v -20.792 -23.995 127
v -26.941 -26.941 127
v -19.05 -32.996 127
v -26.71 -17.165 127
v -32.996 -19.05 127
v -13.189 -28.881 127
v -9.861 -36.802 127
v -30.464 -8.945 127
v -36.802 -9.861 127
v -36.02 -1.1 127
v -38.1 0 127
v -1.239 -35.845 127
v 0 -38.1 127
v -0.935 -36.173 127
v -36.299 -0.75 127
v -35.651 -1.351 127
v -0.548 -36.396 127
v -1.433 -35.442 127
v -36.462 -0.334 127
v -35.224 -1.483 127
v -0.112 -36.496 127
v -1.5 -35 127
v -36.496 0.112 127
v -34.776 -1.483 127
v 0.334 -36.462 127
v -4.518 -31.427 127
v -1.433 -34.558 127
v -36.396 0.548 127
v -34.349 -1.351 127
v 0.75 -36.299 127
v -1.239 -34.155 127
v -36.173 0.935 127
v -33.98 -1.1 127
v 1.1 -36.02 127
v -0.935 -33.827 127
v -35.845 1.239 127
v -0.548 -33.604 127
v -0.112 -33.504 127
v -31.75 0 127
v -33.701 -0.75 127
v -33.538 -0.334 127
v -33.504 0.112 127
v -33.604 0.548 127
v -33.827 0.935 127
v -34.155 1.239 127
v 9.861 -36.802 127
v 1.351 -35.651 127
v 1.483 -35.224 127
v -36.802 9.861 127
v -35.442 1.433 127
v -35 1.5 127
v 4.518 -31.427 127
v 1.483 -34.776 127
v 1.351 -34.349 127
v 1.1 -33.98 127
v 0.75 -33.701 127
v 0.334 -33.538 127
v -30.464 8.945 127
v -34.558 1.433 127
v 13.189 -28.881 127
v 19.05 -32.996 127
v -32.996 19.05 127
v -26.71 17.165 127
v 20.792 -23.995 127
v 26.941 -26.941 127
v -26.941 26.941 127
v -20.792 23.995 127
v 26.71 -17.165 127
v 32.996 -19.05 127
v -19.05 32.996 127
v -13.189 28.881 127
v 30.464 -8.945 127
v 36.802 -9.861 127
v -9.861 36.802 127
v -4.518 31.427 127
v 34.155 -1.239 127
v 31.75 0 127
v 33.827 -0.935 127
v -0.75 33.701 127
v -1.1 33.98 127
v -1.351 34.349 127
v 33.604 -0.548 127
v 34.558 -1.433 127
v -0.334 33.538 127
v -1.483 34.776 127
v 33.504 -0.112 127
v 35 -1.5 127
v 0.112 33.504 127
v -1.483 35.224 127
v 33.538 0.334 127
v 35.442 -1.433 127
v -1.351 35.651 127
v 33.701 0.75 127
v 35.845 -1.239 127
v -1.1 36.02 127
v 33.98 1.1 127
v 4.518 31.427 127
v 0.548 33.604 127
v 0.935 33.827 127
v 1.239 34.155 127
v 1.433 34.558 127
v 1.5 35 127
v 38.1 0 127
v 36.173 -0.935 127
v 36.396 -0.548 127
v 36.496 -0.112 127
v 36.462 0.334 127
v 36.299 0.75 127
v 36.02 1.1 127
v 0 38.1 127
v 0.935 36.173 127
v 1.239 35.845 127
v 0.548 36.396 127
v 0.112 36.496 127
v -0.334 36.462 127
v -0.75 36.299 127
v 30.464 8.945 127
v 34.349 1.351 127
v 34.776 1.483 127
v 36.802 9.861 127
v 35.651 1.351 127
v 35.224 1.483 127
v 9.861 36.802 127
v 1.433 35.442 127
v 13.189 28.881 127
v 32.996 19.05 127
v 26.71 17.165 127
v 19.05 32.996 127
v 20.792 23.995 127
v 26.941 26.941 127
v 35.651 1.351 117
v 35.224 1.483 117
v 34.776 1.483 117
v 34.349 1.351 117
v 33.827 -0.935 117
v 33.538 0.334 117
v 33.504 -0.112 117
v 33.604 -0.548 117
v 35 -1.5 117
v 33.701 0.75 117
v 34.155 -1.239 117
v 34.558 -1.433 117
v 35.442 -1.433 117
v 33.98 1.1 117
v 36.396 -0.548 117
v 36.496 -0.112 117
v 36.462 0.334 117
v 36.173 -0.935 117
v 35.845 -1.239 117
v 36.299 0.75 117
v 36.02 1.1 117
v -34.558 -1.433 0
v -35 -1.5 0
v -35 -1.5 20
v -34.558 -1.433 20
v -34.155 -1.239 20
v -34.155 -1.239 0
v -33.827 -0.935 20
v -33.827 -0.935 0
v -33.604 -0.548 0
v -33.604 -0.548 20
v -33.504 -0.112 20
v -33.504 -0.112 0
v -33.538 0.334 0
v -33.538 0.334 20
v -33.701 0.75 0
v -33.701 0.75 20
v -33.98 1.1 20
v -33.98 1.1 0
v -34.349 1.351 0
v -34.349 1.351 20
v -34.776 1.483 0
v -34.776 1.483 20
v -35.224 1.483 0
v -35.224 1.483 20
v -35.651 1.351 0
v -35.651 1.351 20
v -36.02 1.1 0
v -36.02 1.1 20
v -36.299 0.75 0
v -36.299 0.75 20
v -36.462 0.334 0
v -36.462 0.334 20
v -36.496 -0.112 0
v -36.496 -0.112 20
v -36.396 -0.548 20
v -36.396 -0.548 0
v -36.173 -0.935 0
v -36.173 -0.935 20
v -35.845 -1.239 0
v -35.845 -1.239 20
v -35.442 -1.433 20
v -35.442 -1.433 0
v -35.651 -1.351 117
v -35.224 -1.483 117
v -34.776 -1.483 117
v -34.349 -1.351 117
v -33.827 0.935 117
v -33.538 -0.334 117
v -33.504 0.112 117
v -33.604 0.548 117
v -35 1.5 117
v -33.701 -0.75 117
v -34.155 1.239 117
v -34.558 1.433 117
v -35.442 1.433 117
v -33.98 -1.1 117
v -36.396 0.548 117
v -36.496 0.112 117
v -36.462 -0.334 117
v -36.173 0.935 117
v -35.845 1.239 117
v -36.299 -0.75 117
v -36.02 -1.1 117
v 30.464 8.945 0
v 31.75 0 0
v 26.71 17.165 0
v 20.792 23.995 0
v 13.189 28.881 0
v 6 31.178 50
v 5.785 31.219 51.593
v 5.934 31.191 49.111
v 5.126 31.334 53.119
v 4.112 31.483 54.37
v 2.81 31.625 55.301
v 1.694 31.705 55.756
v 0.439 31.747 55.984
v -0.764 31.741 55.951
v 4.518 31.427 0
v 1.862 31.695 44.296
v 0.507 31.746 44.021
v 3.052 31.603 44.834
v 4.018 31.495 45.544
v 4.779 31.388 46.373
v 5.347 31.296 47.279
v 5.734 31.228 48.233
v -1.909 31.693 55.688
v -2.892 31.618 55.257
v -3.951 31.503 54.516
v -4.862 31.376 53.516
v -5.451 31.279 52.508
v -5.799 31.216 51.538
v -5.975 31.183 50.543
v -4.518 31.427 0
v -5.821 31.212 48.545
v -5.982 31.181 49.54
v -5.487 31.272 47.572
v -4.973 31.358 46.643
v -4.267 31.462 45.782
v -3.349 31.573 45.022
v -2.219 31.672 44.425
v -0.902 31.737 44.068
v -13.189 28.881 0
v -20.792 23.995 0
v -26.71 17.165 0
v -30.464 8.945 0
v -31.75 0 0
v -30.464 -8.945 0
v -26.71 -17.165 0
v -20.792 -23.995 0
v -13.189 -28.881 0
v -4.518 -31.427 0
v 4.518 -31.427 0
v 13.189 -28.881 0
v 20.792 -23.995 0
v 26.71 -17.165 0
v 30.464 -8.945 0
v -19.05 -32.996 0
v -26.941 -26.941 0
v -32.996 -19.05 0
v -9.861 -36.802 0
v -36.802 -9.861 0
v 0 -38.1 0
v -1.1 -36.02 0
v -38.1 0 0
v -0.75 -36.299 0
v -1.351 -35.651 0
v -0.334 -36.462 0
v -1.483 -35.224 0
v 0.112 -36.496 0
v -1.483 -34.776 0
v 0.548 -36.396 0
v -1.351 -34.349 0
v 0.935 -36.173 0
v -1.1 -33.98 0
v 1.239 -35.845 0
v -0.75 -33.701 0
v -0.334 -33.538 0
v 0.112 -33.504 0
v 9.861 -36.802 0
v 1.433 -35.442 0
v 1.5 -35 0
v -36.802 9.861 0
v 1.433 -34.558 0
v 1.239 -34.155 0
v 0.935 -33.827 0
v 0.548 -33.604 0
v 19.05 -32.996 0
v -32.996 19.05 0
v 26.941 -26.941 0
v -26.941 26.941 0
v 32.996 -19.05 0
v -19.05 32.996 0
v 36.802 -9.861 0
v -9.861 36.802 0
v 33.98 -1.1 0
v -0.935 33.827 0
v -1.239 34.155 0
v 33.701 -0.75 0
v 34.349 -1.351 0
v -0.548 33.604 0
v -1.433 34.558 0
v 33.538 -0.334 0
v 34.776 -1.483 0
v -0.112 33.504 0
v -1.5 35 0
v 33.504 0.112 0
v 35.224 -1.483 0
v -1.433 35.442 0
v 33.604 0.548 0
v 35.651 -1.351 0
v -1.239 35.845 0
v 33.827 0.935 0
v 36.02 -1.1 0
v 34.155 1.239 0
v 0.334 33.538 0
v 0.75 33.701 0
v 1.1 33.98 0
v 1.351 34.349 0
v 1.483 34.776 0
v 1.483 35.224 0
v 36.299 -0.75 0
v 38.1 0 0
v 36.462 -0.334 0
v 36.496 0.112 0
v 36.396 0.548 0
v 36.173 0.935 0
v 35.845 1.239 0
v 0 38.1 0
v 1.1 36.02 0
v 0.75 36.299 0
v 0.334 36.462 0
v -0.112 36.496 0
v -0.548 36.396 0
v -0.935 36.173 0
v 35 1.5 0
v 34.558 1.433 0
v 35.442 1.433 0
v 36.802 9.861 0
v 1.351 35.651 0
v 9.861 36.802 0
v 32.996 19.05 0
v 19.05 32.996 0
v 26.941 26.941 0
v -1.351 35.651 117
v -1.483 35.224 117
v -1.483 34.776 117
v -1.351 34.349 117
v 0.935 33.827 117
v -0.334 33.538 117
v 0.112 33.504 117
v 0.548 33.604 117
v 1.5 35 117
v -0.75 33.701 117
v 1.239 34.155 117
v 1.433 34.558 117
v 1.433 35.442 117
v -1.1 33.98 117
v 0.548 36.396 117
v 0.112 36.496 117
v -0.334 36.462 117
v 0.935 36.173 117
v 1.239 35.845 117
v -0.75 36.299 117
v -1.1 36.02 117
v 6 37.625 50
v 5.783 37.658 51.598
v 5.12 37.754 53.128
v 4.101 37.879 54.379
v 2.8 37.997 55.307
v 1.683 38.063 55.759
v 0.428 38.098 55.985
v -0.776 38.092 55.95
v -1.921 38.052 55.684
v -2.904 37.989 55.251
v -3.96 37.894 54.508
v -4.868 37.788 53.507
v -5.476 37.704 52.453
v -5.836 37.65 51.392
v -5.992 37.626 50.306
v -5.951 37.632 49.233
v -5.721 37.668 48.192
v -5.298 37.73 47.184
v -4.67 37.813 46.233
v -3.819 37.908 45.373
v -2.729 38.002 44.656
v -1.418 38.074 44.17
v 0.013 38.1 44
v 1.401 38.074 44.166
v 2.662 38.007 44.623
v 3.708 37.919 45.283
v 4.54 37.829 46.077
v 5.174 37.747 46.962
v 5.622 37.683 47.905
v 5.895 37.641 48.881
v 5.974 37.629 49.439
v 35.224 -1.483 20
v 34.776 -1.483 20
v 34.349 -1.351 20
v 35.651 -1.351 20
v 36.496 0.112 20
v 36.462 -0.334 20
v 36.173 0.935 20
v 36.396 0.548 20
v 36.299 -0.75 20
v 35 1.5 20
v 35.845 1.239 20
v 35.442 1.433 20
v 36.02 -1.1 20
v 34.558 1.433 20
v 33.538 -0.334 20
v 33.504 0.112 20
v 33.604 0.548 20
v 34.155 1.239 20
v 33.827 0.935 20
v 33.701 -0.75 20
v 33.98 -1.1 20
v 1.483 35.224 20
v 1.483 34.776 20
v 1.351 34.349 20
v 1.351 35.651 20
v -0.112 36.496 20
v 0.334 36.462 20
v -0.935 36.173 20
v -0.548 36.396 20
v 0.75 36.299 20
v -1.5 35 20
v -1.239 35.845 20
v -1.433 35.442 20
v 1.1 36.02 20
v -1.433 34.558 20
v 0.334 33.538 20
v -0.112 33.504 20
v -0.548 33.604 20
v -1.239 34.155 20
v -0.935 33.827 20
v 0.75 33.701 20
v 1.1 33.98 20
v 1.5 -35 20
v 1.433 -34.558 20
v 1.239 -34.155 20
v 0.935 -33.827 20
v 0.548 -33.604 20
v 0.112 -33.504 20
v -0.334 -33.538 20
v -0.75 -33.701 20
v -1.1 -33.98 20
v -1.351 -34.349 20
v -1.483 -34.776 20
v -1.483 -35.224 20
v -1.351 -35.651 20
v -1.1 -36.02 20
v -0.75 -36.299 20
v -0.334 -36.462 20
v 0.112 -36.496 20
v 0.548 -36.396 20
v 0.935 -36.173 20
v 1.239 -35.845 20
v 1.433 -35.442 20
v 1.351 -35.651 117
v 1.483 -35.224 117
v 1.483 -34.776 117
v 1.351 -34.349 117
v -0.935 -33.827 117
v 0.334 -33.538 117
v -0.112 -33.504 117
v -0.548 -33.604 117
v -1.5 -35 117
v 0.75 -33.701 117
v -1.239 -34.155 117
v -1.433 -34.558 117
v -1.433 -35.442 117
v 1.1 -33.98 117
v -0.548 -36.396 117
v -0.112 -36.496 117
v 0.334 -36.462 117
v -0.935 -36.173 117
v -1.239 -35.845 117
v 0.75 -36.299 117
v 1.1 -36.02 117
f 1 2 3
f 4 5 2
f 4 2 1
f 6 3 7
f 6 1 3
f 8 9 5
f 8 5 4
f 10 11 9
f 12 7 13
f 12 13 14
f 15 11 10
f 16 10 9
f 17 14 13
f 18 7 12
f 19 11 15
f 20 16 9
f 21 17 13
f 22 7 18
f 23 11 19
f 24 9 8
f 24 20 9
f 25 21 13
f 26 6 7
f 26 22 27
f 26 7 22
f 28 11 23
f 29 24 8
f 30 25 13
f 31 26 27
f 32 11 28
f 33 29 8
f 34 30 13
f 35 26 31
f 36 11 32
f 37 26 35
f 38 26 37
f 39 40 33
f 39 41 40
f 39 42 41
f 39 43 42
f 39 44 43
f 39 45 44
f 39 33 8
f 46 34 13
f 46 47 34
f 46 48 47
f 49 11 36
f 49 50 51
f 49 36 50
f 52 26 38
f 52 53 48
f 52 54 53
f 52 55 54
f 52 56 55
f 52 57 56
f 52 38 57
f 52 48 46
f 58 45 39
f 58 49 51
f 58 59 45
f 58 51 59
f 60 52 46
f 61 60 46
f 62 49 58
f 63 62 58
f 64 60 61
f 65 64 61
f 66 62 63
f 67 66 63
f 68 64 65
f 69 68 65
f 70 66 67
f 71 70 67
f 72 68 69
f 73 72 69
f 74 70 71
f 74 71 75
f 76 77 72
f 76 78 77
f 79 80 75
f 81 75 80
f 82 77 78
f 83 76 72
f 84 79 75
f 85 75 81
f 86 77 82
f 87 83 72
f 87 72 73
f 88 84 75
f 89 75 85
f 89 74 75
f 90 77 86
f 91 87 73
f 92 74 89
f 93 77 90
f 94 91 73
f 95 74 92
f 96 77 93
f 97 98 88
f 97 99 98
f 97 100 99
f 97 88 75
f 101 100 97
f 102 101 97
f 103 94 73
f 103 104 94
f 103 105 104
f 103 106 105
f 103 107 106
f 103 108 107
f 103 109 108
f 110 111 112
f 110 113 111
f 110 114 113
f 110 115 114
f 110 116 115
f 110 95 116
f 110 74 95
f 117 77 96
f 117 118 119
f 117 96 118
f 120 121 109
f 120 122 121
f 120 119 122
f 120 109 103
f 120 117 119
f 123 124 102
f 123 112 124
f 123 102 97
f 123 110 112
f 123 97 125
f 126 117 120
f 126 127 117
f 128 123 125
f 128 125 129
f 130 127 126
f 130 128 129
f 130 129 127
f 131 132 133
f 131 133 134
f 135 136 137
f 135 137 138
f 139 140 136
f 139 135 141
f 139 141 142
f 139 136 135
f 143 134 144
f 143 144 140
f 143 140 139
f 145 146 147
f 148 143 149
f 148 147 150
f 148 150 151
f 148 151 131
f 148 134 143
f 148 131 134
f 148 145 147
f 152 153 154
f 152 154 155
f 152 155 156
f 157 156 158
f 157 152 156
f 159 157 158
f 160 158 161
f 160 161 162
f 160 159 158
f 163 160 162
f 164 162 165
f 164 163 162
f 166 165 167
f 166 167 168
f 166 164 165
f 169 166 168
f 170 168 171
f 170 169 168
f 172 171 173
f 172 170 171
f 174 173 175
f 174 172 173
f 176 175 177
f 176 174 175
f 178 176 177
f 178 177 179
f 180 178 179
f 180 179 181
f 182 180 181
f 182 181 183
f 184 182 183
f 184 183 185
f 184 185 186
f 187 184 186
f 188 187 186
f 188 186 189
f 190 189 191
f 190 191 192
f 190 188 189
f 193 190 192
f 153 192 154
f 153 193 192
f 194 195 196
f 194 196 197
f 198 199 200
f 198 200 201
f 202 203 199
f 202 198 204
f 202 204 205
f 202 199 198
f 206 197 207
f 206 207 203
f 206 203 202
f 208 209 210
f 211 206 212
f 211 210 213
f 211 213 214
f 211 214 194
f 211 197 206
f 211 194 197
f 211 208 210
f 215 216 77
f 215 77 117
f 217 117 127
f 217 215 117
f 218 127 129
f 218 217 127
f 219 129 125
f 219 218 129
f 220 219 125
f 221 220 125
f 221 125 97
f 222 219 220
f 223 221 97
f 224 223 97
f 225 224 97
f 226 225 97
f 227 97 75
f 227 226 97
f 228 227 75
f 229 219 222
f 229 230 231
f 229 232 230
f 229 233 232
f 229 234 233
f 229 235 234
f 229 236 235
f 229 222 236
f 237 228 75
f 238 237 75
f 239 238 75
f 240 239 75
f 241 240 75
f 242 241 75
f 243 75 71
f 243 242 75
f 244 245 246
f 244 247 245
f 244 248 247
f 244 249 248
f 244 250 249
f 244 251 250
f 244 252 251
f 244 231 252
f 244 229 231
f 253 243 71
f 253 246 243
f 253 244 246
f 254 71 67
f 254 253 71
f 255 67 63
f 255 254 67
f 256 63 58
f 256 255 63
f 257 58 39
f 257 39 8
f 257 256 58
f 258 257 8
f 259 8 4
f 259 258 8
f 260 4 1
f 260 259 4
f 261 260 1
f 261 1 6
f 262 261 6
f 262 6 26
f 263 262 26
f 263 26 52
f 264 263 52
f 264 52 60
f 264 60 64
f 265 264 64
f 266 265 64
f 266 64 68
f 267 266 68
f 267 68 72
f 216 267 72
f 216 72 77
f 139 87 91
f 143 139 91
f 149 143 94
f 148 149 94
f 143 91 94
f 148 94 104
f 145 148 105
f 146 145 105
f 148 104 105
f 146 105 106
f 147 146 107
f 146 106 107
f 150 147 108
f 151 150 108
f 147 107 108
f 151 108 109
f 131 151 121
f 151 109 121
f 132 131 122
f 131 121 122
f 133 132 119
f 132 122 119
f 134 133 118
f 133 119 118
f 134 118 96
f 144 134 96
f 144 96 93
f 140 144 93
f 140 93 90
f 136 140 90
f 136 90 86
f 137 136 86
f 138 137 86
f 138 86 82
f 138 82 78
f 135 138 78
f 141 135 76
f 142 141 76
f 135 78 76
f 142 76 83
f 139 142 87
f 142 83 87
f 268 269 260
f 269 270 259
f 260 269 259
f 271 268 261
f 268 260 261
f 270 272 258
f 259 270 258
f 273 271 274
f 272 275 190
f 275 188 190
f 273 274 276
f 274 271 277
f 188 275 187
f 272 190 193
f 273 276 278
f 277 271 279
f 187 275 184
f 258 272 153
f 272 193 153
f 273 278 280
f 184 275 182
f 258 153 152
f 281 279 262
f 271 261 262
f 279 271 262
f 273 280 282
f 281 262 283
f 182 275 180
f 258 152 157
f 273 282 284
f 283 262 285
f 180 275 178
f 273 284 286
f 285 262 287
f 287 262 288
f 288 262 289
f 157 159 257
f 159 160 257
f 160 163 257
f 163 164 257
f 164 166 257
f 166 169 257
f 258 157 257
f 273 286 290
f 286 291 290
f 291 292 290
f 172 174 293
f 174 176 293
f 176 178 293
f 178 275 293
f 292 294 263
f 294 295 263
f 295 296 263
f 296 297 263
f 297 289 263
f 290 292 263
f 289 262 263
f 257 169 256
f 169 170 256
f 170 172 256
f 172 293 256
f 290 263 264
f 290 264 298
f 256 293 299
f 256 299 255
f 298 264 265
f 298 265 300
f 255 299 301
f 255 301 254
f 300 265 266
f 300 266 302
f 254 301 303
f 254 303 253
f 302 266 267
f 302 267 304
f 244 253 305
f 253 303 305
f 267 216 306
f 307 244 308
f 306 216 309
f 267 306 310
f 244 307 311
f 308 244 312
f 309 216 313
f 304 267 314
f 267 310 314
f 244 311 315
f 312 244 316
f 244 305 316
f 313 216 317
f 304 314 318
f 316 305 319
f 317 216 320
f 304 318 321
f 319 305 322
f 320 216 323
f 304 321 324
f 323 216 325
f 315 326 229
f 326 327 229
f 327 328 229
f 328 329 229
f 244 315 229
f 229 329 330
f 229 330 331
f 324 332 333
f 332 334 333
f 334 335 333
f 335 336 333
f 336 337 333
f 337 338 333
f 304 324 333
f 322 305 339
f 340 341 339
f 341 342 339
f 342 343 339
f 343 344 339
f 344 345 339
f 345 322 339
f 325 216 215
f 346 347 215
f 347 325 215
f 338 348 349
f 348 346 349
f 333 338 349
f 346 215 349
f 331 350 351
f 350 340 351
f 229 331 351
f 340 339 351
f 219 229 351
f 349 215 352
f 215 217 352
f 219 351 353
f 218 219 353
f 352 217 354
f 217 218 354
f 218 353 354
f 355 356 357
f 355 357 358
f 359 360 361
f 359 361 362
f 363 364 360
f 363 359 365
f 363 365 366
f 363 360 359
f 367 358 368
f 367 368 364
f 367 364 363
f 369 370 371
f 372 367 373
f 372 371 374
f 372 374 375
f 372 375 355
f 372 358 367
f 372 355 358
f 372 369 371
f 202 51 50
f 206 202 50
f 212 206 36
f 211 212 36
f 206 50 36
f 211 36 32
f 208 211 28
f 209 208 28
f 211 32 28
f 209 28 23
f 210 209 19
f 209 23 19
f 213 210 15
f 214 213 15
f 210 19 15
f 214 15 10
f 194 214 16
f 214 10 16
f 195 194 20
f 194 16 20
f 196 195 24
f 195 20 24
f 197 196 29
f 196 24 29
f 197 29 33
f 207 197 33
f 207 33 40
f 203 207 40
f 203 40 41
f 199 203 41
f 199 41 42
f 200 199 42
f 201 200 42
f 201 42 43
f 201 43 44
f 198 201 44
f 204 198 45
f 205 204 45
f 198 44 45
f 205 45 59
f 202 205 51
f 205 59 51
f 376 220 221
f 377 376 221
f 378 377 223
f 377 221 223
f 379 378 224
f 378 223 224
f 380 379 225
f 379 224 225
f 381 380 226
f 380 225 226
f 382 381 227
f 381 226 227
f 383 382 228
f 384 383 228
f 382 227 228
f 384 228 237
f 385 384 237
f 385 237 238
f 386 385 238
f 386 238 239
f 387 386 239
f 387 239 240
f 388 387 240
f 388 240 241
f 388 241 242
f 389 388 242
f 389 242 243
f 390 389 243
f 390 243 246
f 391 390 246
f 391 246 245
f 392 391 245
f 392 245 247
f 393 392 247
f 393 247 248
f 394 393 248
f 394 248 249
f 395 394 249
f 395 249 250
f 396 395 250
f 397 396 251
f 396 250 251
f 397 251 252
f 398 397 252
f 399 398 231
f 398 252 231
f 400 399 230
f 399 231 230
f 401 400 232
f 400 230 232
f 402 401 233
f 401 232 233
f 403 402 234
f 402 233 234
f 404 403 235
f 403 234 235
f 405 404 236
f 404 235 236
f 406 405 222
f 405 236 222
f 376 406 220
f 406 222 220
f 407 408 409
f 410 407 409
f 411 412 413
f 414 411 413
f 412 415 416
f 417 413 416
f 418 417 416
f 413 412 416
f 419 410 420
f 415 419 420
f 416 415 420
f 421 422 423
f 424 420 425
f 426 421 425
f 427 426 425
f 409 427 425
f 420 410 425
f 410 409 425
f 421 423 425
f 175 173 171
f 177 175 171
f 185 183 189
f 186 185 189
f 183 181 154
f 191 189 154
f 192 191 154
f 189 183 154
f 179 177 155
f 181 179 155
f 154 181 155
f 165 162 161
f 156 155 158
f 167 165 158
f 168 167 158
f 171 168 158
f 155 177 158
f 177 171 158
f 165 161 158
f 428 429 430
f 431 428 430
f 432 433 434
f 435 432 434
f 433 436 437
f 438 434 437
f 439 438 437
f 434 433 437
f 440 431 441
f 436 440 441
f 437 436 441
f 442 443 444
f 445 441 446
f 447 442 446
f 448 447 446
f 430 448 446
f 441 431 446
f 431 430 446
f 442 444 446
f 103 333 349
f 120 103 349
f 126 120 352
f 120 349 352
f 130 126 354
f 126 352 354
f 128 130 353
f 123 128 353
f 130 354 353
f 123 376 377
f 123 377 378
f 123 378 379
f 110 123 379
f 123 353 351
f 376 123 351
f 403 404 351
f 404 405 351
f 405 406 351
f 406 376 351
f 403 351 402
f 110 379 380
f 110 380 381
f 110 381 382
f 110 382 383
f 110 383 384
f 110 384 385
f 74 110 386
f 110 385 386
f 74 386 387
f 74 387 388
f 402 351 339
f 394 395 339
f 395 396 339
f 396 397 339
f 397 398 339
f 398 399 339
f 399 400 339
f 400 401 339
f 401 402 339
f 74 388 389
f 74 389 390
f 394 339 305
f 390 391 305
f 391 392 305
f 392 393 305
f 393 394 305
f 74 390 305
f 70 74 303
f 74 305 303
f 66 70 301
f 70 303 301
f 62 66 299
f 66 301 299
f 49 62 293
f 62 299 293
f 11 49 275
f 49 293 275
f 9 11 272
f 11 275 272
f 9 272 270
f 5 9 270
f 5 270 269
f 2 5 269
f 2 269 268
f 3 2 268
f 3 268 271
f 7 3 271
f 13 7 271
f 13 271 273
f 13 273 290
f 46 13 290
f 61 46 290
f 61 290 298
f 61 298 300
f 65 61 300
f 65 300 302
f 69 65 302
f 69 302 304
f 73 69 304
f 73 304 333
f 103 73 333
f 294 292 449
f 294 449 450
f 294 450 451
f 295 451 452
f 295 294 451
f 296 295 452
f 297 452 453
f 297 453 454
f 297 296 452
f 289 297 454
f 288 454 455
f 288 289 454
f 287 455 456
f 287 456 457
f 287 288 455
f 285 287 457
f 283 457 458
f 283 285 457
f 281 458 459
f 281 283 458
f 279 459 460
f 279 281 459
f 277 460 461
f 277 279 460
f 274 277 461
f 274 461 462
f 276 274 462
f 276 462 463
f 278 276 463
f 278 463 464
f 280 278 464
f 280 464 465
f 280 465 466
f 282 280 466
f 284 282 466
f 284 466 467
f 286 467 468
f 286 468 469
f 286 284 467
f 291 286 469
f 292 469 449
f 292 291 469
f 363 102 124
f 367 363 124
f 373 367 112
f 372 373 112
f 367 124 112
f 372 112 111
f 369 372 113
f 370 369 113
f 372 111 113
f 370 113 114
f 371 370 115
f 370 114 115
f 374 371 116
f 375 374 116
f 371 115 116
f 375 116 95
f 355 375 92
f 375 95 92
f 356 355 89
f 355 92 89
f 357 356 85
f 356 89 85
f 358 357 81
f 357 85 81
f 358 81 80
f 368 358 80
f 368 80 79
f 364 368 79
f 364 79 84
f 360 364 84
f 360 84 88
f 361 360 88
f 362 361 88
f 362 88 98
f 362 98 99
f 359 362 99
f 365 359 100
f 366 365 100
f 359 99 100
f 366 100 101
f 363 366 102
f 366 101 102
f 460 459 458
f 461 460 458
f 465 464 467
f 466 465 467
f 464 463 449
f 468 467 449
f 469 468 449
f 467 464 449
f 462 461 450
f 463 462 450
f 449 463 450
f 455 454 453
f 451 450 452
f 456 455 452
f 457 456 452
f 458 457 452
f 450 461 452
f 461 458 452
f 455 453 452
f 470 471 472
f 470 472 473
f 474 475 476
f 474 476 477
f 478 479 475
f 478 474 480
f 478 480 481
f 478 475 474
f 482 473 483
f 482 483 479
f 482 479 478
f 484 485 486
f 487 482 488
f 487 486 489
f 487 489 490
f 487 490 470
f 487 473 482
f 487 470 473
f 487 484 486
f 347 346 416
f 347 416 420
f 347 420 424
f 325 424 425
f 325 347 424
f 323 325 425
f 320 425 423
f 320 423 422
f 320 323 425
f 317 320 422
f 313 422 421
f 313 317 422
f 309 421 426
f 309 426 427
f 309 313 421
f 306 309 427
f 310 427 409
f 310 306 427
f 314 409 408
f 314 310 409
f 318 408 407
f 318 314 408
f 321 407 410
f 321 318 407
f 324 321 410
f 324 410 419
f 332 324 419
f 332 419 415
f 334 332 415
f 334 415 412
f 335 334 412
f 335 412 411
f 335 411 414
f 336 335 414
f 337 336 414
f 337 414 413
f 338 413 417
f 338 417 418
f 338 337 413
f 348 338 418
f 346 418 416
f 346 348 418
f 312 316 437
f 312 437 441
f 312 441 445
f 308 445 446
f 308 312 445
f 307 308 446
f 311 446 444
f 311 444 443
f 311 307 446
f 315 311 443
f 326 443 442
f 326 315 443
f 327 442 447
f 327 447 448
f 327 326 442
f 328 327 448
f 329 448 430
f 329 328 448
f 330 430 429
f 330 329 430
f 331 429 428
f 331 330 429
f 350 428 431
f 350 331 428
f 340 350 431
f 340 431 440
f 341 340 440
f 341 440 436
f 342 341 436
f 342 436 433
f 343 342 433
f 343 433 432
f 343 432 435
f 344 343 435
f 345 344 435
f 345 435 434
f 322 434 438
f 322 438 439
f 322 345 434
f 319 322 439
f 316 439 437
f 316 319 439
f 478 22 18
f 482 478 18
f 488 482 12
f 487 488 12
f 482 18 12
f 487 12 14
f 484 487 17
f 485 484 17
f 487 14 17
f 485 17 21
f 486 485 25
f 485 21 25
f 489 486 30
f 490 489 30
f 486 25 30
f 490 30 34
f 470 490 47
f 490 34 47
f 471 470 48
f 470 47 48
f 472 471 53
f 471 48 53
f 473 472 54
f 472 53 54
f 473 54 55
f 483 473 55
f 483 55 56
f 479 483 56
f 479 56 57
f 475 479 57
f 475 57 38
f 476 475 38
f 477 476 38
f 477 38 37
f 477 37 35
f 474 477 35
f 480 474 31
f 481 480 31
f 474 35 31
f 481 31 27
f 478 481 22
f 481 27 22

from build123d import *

# Parameters (mm, degrees)
F0_R     = 38.1
F0_R_2   = 1.5
F0_R_3   = 31.75
F1_DEPTH = 127
F2_R     = 6
F3_DEPTH = 42.2
F4_R     = 1.5
F5_DEPTH = 10
F6_COUNT = 4
F7_DEPTH = 20
F8_COUNT = 4


with BuildPart() as f1:
    # F0 (on Top) → F1 (new body)
    with BuildSketch(Plane.XY):
        Circle(F0_R)
        with Locations((0, -35)):
            Circle(F0_R_2, mode=Mode.SUBTRACT)
        Circle(F0_R_3, mode=Mode.SUBTRACT)
        with Locations((0, -35)):
            Circle(F0_R_2)
    extrude(amount=F1_DEPTH)

    # F2 (on Front) → F3 (cut)
    with BuildSketch(Plane.XZ):
        with Locations((0, 50)):
            Circle(F2_R)
    extrude(amount=-F3_DEPTH, mode=Mode.SUBTRACT)

    # F6: F5 ×4 about axis
    f6_axis = Axis((0, 0, 127), (0, 0, 1))


with BuildPart() as f5:
    # F4 (on face) → F5 (new body)
    with BuildSketch(Plane.XY.offset(127)):
        with Locations((0, 35)):
            Circle(F4_R)
    extrude(amount=-F5_DEPTH)


with BuildPart() as f1_1:
    add(f1.part)
    for i in range(1, F6_COUNT):
        add(f5.part.rotate(f6_axis, i * 360 / F6_COUNT), mode=Mode.SUBTRACT)

    # F6#seed: cut F5
    add(f5.part, mode=Mode.SUBTRACT)

    # F8: F7 ×4 about axis
    f8_axis = Axis((0, 0, 0), (0, 0, 1))


with BuildPart() as f7:
    # F0 (on Top) → F7 (new body)
    with BuildSketch(Plane.XY):
        with Locations((0, -35)):
            Circle(F0_R_2)
    extrude(amount=F7_DEPTH)


with BuildPart() as f1_2:
    add(f1_1.part)
    for i in range(1, F8_COUNT):
        add(f7.part.rotate(f8_axis, i * 360 / F8_COUNT), mode=Mode.SUBTRACT)

    # F8#seed: cut F7
    add(f7.part, mode=Mode.SUBTRACT)


solid = f1_2.part
